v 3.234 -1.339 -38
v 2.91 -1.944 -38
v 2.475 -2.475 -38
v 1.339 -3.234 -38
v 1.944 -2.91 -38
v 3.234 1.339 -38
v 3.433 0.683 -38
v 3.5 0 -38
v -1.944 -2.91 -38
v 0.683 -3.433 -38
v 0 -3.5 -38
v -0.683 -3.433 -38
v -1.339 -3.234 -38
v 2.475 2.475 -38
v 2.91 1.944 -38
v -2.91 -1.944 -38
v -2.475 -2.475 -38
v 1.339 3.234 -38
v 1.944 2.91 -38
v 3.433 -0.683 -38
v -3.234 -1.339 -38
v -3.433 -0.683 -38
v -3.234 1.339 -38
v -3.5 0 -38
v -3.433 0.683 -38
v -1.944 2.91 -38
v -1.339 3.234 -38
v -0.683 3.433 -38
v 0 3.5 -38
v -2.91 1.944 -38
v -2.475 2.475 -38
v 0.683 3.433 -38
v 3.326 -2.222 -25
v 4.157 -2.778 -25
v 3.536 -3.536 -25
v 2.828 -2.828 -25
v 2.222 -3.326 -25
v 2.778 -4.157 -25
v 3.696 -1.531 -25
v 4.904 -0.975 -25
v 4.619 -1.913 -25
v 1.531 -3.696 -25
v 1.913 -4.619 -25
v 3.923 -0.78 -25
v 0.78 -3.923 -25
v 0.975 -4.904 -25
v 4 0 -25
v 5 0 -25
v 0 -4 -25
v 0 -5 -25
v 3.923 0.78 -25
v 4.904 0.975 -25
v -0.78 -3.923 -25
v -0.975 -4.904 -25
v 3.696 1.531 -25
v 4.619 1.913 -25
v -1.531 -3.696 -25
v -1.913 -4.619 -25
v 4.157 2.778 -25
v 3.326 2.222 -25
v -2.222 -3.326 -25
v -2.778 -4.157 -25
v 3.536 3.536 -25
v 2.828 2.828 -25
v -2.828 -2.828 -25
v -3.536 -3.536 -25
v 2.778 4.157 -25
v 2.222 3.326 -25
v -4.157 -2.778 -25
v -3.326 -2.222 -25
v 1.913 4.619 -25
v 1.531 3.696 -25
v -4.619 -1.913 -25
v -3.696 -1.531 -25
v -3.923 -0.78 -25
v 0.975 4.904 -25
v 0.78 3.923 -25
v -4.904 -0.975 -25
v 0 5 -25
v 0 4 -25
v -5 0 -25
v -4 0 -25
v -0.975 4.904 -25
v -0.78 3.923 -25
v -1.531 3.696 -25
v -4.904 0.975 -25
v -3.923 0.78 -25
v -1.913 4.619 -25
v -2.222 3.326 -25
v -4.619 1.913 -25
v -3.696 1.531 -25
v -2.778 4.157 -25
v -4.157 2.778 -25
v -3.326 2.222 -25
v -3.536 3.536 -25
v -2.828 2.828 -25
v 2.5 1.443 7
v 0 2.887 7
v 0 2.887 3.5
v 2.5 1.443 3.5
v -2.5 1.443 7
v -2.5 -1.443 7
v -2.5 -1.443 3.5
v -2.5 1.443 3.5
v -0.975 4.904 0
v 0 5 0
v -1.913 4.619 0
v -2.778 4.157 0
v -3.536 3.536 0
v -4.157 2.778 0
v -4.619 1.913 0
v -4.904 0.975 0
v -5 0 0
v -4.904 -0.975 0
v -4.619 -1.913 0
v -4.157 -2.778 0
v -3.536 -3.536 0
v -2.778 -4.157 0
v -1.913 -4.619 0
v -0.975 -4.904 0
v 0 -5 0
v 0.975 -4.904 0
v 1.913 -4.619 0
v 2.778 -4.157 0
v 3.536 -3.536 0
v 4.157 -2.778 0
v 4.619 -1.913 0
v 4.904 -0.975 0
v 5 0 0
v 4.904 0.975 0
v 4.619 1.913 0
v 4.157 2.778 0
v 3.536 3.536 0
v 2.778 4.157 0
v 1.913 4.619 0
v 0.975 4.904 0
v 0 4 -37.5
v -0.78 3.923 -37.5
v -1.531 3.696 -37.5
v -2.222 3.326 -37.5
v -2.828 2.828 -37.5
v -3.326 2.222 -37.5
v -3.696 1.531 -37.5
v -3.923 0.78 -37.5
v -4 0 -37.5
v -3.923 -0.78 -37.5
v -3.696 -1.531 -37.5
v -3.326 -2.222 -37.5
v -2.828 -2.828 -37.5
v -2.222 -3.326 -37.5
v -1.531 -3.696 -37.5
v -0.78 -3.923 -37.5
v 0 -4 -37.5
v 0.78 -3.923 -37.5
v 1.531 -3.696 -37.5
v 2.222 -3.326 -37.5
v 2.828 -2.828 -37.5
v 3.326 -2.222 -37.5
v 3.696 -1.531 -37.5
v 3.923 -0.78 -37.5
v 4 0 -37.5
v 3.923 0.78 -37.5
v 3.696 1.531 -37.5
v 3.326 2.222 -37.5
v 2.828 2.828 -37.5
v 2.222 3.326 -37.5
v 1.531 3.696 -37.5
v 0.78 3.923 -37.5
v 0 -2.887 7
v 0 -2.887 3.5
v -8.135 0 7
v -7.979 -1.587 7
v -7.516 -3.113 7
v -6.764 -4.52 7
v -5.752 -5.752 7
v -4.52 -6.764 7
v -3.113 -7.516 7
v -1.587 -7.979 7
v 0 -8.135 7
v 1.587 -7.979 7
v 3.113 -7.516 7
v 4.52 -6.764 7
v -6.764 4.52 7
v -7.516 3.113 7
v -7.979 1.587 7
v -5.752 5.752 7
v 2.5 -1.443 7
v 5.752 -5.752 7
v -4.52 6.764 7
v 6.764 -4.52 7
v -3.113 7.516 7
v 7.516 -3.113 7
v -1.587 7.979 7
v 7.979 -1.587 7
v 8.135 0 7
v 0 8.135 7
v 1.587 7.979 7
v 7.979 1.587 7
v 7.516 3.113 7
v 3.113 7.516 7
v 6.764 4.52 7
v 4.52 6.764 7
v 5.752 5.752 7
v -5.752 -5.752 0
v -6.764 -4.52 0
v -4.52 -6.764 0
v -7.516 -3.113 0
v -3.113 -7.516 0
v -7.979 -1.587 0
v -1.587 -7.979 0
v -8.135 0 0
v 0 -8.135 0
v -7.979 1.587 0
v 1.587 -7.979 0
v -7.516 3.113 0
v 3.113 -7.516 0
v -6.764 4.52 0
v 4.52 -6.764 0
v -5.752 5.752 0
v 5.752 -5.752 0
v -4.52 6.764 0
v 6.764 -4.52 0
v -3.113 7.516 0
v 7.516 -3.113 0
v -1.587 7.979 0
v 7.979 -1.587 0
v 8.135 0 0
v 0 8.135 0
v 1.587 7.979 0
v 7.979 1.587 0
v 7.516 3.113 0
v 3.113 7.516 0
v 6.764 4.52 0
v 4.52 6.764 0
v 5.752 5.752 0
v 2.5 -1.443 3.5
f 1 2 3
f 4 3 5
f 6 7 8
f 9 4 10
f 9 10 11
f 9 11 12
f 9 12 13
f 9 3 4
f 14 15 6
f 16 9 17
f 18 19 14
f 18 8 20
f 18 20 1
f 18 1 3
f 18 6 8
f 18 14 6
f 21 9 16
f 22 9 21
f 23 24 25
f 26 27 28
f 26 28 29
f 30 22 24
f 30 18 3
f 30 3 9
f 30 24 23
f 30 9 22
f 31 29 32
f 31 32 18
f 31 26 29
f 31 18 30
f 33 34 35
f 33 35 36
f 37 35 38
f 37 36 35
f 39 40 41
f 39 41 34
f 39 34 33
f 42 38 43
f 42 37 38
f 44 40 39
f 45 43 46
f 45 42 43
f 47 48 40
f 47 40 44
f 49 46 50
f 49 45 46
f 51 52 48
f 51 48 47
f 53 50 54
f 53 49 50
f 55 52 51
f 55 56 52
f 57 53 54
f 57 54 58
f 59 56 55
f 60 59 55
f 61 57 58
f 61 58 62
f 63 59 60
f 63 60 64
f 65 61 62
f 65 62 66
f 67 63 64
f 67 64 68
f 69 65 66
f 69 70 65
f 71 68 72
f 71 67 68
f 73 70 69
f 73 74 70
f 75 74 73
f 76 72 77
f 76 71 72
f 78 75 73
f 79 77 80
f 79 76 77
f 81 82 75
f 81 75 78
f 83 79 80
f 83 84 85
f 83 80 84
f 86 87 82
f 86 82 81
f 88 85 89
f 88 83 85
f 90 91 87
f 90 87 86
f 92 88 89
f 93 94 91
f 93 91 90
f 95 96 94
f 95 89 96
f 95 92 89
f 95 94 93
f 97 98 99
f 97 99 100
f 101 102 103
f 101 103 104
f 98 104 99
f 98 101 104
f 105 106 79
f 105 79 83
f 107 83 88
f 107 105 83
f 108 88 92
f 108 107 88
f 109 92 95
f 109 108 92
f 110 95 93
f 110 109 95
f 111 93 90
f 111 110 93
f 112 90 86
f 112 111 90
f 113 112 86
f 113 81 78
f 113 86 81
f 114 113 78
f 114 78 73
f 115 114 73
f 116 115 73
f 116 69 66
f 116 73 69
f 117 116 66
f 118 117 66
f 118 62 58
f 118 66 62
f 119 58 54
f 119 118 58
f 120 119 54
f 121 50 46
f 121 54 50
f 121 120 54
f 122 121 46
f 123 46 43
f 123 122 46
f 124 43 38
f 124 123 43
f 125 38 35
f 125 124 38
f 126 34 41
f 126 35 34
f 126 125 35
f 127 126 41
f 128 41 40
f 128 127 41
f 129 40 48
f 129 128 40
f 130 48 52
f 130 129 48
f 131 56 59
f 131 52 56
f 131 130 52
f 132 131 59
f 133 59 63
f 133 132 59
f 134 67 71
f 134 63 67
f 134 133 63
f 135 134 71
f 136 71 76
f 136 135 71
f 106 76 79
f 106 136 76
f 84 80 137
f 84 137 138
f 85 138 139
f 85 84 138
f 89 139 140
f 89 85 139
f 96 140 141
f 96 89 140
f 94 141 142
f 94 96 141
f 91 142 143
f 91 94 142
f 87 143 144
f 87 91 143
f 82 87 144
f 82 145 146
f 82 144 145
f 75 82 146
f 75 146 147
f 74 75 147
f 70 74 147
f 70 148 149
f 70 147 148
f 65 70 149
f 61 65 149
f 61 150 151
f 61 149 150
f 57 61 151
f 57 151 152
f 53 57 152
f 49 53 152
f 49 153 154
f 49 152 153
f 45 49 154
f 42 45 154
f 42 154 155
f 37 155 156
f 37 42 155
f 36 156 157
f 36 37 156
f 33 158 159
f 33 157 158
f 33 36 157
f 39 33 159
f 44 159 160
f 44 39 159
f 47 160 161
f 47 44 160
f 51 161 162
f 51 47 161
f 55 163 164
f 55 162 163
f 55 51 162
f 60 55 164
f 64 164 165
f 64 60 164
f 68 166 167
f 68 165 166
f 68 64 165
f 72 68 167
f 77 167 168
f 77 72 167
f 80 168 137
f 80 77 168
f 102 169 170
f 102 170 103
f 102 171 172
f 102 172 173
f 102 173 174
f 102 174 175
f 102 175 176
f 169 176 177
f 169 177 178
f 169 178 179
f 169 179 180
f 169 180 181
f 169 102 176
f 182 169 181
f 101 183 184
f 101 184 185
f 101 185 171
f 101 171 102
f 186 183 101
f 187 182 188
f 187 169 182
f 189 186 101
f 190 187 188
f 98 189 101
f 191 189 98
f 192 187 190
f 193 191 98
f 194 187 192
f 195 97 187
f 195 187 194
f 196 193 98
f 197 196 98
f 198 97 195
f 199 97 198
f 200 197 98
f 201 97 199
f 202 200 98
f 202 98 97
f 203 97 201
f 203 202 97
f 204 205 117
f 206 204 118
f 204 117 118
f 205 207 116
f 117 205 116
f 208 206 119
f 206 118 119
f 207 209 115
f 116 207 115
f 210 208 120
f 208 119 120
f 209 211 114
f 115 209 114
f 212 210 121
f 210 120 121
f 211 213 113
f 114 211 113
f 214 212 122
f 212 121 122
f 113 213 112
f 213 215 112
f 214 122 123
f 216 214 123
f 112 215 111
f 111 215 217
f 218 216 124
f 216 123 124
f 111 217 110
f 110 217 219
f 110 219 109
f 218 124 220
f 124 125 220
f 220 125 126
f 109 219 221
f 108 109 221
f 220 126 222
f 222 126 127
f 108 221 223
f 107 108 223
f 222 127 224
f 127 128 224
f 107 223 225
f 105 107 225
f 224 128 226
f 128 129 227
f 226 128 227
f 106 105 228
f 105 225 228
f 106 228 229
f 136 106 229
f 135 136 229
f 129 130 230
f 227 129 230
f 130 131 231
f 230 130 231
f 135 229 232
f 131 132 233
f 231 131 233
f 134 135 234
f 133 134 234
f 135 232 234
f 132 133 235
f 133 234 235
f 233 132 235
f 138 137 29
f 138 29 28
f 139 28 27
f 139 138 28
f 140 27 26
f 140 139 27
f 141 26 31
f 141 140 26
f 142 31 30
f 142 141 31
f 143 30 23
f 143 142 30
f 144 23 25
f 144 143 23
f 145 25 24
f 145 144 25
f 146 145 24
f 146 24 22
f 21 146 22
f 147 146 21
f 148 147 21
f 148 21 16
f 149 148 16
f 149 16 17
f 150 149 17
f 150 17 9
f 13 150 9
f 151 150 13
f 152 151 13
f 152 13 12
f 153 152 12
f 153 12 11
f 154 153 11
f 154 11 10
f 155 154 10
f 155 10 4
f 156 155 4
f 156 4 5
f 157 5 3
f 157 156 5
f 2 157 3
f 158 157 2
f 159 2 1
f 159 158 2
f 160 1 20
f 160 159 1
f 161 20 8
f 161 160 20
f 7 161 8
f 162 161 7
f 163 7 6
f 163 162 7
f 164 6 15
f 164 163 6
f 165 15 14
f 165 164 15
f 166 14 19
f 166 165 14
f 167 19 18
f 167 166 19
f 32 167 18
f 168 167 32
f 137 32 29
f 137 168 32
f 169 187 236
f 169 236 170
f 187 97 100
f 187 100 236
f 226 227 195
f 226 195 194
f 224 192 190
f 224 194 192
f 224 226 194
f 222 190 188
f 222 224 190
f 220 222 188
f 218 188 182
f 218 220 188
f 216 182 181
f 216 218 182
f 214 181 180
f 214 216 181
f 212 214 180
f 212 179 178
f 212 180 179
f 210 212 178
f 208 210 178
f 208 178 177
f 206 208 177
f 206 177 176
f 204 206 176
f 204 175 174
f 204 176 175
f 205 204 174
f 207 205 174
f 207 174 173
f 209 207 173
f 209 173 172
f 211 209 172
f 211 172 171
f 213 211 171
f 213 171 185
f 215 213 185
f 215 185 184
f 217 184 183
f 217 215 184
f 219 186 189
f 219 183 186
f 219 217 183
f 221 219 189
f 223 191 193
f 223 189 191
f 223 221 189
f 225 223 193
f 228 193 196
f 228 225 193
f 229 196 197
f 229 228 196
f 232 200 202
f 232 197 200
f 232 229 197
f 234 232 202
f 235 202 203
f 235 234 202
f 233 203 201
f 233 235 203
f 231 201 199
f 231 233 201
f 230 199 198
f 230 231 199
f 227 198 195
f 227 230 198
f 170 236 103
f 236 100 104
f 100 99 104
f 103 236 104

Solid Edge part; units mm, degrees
sketch "Sketch1" plane through (0, 0, 0) normal (0, 0, 1) x (1, 0, 0)
  circle A0 centre (0, 0) radius 8.135
  dimension "D1" = 16.27
extrude "Protrusion1" add sketch "Sketch1" along normal blind 7
sketch "Sketch2" plane through (0, 0, 7) normal (0, 0, 1) x (1, 0, 0)
  line L0 (0, -2.8868) -> (-2.5, -1.4434)
  line L1 (-2.5, -1.4434) -> (-2.5, 1.4434)
  line L2 (-2.5, 1.4434) -> (0, 2.8868)
  line L3 (0, 2.8868) -> (2.5, 1.4434)
  line L4 (2.5, 1.4434) -> (2.5, -1.4434)
  line L5 (2.5, -1.4434) -> (0, -2.8868)
  dimension "D1" = 5
extrude "Cutout1" cut sketch "Sketch2" against normal blind 3.5
sketch "Sketch3" plane through (0, 0, 0) normal (0, 0, -1) x (0, 1, 0)
  circle A0 centre (0, 0) radius 5
  dimension "D1" = 10
extrude "Protrusion2" add sketch "Sketch3" along normal blind 25
sketch "Sketch4" plane through (0, 0, -25) normal (0, 0, -1) x (0, 1, 0)
  circle A0 centre (0, 0) radius 4
  dimension "D1" = 8
extrude "Protrusion3" add sketch "Sketch4" along normal blind 13
chamfer "Chamfer1" distance 0.5 angle 45 1 edges at (0, -4, -38)
properties part number "186231"
